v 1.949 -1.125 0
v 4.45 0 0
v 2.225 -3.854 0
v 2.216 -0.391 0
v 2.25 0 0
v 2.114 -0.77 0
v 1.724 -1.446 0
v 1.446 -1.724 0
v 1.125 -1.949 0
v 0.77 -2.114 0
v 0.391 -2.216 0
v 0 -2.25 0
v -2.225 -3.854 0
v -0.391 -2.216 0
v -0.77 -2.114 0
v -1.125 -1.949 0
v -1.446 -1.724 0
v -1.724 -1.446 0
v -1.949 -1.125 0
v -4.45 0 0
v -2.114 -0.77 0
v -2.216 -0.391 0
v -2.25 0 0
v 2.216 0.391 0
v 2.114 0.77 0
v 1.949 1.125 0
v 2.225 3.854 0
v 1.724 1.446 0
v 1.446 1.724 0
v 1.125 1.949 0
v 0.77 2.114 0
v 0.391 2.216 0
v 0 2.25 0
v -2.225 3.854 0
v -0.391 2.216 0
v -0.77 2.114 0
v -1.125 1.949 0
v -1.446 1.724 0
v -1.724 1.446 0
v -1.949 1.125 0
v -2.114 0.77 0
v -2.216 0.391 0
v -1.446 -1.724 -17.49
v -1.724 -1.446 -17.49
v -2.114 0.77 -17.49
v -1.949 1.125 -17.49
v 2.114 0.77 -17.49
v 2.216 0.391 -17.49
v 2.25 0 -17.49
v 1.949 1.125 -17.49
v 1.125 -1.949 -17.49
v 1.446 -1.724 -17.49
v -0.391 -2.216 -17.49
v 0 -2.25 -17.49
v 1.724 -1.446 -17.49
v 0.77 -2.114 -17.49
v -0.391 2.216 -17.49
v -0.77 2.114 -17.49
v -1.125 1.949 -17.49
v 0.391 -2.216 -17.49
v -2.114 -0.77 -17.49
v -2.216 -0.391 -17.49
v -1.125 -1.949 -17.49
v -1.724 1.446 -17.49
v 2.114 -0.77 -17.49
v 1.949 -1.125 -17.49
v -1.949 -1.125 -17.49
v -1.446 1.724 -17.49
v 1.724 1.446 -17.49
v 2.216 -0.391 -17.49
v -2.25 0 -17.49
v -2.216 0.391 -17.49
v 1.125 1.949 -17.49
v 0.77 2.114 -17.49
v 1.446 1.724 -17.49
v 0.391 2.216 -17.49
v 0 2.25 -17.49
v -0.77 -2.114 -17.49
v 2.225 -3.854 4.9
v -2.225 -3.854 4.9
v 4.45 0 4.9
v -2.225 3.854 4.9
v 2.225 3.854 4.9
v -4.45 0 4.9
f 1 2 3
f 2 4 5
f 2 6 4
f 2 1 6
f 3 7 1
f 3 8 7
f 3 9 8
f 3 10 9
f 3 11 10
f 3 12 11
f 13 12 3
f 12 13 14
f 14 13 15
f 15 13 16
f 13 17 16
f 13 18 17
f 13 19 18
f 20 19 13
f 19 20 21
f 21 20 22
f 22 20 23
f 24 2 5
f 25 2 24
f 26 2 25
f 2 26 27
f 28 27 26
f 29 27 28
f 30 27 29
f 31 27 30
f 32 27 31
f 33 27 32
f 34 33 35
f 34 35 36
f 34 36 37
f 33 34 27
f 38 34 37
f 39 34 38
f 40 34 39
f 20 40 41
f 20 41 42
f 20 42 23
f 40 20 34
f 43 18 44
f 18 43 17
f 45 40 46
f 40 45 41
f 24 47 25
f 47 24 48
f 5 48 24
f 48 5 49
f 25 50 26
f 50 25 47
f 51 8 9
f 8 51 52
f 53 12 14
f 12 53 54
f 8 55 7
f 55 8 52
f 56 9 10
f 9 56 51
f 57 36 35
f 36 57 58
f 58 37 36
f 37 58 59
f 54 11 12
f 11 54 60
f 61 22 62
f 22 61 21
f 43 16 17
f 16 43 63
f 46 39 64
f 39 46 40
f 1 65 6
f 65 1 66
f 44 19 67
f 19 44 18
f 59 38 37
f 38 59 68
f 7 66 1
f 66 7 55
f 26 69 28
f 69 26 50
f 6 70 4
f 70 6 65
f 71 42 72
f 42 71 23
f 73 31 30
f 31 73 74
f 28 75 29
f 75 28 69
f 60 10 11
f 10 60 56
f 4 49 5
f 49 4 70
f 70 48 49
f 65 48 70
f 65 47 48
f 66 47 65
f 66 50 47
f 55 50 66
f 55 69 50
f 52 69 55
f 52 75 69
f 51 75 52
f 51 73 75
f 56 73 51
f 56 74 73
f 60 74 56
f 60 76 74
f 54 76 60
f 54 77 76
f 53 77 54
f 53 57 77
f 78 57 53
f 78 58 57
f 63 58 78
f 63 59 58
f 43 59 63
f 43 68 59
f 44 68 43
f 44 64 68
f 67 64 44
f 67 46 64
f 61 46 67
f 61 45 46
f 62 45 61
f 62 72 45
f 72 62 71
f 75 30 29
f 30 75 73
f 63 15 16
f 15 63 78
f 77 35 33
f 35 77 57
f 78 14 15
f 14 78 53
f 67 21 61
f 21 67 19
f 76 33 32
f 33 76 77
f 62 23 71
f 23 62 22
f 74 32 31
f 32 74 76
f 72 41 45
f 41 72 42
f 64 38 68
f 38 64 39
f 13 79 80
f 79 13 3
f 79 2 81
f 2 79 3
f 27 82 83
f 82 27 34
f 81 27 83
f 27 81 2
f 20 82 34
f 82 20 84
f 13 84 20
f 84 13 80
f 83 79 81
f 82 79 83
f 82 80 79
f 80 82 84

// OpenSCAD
module m4_nut() {
    add = 1.9;
    width = 7;
    height = 3;
    
    radius = (width + add) / 2;
    
    cylinder(height + add, radius, radius, $fn = 6);
    
}


module m4_screw_round(length) {

    add = 0.5;
    headWidth = 7;
    headHeight = 2.5;

    bodyRadius = (4 + add) / 2;

    headRadius = (headWidth + add) / 2;

    union() {
        cylinder(headHeight + add, headRadius, headRadius, $fn = 36);
        
        translate([0,0,length * -1 + headHeight + 0.01]) {
            cylinder(length, bodyRadius, bodyRadius, $fn = 36);
        }
    }
    
    
}



m4_screw_round(20);

m4_nut();
